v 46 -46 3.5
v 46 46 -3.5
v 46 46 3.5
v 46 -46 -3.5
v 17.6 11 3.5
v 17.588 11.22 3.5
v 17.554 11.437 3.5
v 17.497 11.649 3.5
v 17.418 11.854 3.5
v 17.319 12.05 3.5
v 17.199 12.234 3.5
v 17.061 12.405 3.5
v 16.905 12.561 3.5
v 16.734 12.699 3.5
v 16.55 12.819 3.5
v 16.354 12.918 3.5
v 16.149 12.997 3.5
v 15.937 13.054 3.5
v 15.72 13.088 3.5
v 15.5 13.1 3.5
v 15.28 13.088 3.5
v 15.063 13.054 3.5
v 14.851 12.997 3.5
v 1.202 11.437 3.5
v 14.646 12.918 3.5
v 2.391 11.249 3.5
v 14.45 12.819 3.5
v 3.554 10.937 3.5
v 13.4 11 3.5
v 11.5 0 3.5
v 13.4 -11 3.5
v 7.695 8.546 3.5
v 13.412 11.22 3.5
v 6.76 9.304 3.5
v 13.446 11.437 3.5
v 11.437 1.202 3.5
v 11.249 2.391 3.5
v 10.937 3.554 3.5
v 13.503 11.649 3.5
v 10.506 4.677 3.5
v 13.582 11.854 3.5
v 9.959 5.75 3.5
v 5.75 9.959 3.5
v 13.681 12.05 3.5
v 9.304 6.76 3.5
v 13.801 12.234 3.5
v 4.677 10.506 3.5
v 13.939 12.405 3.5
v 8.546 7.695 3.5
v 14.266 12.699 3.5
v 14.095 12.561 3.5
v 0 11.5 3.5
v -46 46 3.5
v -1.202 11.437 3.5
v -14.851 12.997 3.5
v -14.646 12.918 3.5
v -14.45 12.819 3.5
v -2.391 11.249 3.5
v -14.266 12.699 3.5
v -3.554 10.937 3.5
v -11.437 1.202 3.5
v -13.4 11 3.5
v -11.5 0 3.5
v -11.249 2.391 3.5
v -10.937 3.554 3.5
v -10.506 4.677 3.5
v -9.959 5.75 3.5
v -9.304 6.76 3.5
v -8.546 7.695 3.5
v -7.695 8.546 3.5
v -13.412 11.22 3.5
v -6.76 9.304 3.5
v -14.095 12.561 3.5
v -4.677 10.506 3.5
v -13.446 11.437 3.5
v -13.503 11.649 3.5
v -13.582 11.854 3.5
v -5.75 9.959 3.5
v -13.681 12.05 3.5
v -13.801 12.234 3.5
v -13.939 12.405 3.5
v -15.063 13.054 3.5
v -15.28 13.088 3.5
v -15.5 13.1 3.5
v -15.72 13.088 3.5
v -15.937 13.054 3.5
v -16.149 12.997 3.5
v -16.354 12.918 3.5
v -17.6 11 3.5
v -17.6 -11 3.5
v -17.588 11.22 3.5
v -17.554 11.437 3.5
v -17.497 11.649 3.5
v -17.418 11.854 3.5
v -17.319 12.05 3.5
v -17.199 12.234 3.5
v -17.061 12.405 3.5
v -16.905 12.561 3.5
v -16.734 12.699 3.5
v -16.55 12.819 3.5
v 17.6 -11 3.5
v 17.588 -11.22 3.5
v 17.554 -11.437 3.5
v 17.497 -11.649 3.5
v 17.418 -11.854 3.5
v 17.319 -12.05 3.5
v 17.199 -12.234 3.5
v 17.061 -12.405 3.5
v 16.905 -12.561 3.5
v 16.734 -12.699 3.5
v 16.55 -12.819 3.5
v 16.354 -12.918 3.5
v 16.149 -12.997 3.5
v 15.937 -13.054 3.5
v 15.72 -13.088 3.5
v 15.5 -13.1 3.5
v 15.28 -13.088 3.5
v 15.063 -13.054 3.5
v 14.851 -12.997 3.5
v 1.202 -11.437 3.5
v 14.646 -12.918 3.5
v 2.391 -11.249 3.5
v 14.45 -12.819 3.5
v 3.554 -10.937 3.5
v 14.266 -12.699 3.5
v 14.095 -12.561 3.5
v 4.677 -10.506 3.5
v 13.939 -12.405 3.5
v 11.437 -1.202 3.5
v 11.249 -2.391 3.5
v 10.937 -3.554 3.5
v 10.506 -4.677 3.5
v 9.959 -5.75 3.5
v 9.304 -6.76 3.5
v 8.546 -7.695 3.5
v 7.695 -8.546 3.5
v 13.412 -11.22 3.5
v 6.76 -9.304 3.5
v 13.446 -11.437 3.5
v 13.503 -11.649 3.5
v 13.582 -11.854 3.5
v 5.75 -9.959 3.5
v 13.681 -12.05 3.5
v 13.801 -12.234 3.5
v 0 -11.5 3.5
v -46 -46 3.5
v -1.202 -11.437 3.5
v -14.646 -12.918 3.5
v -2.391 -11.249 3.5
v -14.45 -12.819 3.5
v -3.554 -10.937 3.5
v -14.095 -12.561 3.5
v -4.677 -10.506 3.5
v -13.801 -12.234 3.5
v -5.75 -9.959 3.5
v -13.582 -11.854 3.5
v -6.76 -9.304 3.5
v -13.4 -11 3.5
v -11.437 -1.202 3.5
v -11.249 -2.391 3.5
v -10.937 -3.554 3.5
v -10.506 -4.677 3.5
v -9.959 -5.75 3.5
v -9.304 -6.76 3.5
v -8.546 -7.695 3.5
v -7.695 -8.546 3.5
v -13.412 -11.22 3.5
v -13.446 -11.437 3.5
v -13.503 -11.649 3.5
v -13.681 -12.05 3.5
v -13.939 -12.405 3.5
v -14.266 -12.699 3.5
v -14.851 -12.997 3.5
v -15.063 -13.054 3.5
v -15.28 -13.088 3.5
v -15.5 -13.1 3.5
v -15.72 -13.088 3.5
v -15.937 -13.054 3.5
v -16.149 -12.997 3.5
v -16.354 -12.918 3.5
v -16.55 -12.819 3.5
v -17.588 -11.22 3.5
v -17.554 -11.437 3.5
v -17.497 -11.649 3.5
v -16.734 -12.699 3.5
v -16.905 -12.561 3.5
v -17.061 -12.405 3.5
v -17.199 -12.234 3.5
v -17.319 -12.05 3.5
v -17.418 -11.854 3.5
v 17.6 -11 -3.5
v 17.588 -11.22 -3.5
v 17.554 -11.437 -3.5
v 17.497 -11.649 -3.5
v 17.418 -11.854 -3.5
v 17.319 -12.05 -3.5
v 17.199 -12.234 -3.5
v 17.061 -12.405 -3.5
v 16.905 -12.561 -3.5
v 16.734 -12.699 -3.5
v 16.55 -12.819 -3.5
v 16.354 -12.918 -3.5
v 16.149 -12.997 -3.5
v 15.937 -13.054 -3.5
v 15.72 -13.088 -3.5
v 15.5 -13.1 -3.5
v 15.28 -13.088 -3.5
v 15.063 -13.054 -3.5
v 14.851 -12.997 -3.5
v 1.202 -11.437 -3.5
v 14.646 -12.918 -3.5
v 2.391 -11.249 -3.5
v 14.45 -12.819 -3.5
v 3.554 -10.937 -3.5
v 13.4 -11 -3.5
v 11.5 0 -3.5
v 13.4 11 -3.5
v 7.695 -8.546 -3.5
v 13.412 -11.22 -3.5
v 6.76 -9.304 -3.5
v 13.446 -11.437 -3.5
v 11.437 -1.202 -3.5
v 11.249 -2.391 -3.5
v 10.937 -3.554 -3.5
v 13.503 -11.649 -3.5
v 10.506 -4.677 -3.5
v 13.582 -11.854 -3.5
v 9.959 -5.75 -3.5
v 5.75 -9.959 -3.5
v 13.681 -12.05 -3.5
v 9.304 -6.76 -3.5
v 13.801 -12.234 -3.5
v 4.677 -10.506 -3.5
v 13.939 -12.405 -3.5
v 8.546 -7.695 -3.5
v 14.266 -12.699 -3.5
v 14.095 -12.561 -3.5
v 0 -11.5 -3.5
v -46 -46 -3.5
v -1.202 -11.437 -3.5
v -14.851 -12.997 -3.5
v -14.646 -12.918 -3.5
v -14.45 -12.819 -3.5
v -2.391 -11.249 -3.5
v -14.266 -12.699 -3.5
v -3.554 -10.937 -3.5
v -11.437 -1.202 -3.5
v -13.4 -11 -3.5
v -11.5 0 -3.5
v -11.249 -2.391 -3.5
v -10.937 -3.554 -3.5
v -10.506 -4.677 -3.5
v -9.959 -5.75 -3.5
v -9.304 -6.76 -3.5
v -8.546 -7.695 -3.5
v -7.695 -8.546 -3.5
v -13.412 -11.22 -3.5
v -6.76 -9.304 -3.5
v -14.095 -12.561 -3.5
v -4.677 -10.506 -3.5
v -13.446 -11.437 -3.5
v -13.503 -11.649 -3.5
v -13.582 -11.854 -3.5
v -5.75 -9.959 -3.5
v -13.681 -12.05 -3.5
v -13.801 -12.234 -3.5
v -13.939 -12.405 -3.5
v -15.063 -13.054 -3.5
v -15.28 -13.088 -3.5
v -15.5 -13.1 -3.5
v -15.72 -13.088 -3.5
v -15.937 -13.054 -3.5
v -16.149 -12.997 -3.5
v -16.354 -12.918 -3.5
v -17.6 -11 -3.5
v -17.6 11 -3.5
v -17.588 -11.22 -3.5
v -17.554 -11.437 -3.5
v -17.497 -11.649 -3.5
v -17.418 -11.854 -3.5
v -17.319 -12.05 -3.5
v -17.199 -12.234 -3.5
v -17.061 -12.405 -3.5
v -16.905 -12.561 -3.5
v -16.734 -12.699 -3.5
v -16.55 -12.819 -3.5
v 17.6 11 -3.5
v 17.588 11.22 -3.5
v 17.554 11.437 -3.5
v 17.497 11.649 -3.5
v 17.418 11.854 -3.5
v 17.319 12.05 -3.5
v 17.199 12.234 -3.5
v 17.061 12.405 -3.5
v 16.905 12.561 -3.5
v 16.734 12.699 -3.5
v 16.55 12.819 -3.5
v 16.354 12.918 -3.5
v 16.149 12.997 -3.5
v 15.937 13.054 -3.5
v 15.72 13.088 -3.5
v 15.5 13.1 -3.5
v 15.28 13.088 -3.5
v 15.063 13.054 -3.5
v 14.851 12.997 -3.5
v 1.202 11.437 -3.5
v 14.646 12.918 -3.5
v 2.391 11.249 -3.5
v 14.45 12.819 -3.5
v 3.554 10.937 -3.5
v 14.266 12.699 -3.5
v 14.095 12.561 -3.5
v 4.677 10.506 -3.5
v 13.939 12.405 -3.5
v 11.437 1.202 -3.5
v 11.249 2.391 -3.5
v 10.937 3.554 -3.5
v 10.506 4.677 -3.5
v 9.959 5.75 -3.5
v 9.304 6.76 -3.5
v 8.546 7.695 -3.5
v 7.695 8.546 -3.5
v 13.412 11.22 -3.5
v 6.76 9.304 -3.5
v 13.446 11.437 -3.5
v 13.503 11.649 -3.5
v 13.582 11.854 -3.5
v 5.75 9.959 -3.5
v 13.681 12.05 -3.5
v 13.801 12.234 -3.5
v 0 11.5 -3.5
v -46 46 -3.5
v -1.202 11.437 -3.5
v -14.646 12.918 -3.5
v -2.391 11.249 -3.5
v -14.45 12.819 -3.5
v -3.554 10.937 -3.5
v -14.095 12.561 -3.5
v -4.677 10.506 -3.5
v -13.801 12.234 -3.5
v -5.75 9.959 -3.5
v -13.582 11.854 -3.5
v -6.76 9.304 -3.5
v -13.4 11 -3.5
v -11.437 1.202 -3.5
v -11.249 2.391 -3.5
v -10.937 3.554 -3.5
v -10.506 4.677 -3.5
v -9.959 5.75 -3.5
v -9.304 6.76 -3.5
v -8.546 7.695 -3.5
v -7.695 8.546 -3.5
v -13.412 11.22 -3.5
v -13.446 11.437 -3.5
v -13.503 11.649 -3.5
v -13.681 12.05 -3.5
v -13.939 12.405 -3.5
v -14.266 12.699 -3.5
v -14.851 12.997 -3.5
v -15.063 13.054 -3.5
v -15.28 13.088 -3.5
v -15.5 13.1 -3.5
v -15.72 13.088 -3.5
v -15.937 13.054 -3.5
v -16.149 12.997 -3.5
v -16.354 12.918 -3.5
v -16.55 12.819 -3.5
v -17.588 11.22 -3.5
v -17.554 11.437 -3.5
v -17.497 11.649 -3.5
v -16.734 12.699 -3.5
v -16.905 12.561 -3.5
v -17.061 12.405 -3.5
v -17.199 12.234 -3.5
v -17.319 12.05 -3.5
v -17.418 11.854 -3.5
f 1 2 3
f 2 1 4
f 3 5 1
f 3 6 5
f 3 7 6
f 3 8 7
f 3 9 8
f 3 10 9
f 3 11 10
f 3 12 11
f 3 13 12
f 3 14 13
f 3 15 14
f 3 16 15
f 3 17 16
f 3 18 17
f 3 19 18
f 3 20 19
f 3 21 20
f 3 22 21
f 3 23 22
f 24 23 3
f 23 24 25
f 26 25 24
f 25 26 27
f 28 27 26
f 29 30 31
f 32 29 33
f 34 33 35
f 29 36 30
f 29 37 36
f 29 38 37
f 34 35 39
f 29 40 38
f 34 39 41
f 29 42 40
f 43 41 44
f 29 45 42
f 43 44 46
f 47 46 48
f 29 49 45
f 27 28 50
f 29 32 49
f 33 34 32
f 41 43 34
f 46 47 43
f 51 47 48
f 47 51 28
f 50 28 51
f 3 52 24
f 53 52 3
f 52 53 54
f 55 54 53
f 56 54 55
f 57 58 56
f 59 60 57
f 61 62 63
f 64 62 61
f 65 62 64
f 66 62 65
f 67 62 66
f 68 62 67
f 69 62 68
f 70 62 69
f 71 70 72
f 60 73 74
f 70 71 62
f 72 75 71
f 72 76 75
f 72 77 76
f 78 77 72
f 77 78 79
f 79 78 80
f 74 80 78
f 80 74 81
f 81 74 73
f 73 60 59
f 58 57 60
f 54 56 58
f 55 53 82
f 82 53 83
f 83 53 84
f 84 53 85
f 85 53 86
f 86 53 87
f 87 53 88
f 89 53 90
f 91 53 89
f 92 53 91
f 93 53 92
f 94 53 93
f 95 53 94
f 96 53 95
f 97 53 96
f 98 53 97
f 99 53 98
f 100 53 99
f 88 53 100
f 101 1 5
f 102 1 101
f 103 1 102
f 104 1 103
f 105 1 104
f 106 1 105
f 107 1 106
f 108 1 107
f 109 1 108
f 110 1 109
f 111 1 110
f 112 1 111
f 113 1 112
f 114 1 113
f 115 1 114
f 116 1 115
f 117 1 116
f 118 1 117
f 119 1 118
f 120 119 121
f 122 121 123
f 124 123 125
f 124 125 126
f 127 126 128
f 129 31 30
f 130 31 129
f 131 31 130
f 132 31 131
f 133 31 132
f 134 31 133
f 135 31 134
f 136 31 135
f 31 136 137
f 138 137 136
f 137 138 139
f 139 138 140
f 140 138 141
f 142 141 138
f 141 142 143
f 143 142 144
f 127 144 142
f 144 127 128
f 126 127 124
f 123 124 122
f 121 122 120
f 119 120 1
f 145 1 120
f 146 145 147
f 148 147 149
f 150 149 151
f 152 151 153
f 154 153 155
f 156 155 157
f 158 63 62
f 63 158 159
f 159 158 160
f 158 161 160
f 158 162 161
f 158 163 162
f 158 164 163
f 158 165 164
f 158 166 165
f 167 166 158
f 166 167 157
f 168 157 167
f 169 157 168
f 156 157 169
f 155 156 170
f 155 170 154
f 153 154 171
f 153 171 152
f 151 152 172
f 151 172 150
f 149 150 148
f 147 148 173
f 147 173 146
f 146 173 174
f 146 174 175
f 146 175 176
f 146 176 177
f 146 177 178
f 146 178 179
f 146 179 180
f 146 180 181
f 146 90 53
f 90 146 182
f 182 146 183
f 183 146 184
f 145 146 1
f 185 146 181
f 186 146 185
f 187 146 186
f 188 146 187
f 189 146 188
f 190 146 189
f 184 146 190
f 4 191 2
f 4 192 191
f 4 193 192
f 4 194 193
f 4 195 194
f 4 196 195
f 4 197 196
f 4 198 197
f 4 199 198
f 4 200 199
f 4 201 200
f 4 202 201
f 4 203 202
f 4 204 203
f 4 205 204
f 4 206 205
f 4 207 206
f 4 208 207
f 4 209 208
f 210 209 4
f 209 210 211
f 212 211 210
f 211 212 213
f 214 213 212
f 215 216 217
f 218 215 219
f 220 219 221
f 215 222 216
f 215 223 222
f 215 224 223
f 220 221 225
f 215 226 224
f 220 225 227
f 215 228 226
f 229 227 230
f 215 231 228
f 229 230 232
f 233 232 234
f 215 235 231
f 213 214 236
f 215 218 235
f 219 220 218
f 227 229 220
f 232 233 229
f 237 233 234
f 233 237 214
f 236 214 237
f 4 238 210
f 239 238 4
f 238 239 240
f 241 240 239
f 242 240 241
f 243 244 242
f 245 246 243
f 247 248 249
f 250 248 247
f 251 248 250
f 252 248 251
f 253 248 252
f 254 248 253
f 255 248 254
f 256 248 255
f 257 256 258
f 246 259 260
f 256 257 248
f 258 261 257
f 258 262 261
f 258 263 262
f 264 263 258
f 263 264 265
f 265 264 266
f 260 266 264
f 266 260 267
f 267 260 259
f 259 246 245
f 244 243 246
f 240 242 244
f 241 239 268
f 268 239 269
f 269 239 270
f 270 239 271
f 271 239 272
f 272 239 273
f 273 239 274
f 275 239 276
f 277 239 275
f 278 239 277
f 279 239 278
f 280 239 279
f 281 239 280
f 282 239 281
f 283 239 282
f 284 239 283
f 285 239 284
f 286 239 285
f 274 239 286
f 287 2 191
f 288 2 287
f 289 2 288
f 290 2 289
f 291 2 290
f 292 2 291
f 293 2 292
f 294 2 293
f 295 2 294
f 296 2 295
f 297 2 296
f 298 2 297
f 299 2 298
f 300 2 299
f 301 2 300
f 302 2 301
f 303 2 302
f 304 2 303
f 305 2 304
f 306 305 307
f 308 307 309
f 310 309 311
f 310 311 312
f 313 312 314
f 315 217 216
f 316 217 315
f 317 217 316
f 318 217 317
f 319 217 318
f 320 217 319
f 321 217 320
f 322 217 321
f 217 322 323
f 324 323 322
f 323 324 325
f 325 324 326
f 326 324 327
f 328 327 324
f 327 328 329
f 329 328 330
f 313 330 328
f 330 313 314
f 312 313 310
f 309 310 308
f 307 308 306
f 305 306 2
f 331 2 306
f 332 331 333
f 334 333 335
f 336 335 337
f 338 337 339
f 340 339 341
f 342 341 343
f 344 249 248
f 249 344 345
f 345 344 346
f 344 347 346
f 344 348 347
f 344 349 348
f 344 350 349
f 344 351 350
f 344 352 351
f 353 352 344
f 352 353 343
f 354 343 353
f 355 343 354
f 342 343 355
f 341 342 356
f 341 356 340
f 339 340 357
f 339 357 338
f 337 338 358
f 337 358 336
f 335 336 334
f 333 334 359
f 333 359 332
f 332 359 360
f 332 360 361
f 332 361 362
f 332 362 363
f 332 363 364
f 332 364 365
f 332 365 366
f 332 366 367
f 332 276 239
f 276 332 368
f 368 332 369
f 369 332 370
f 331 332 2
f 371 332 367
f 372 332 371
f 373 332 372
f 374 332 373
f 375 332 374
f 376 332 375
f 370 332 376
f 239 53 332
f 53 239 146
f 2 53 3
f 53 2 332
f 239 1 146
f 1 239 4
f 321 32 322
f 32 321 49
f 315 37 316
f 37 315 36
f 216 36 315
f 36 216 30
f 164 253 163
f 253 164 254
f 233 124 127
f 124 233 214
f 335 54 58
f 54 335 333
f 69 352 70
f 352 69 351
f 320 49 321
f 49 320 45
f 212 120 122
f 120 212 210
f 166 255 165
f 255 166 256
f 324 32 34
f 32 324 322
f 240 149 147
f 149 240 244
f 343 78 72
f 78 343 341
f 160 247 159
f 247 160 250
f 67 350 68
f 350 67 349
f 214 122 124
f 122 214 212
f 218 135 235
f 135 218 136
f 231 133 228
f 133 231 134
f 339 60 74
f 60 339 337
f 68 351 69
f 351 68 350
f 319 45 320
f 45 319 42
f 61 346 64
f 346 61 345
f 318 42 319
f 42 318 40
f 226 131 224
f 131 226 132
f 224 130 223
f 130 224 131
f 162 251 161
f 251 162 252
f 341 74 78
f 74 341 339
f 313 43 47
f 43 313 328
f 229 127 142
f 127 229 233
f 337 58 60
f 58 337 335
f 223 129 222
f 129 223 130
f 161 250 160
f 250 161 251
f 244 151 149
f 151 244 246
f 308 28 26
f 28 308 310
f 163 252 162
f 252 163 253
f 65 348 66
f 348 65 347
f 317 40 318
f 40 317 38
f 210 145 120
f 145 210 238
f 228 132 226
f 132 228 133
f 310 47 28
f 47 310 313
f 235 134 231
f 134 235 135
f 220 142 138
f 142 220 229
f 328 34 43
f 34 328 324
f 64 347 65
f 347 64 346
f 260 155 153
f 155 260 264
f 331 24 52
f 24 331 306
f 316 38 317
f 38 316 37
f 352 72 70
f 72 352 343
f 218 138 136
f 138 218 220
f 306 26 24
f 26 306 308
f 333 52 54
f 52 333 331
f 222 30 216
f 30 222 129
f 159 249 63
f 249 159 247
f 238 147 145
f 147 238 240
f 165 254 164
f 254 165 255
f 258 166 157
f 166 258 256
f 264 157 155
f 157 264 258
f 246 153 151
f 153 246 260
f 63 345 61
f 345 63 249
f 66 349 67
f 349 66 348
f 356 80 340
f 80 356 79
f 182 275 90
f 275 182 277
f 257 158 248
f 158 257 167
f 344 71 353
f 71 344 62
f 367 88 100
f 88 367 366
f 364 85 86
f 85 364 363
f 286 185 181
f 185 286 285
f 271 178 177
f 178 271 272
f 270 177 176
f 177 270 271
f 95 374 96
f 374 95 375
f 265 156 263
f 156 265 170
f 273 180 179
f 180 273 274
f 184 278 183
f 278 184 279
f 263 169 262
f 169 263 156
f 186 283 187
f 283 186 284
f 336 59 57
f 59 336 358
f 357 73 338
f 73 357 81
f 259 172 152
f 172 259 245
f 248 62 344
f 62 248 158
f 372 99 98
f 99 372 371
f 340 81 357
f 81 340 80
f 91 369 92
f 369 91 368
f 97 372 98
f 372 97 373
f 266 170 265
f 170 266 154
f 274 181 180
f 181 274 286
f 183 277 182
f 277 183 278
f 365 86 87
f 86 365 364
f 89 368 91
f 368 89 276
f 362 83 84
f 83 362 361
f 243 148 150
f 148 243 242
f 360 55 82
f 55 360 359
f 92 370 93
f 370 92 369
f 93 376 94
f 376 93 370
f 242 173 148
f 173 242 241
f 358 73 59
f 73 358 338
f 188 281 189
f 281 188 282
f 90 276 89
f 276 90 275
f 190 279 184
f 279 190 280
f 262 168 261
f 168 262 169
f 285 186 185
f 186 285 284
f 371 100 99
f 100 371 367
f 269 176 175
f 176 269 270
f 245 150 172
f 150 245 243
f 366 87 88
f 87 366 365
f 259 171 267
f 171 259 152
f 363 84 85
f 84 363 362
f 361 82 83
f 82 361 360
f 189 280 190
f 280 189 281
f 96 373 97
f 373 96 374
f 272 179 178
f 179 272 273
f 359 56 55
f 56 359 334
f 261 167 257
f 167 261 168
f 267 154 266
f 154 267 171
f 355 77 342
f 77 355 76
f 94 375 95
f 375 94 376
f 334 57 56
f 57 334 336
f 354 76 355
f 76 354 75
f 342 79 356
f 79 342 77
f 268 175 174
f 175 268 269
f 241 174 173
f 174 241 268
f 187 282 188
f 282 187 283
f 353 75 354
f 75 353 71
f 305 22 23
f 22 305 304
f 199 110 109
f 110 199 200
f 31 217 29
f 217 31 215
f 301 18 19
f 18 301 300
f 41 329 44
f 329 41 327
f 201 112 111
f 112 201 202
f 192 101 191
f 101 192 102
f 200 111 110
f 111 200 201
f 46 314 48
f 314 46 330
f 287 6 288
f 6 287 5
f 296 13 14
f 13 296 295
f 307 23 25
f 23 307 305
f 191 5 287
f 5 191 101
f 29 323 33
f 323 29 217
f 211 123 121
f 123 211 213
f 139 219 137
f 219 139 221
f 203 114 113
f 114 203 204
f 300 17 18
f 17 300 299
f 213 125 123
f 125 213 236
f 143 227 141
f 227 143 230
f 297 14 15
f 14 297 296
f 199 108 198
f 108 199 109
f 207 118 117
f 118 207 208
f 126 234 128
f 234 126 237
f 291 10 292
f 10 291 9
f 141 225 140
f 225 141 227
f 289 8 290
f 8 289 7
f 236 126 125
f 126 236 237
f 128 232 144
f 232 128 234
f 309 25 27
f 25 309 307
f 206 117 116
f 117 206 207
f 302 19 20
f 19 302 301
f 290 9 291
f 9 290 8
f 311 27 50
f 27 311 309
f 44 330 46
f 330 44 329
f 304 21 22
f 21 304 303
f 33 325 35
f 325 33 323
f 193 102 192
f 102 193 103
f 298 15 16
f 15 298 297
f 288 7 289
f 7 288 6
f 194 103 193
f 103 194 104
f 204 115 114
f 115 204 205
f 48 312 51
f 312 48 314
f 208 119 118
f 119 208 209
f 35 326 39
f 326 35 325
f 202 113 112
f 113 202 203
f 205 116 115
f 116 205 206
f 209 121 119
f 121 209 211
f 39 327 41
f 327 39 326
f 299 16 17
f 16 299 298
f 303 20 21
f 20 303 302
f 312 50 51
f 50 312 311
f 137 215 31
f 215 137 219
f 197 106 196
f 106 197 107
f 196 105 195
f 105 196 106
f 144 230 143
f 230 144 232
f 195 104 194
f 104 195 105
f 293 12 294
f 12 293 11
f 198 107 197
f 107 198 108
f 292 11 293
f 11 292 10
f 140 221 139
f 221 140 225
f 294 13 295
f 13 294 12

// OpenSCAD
// NEMA 17 adjustable motor plate, 92 mm square.
$fn = 60;
eps = 0.02;
plate = 92;
plate_t = 7;
hole_pitch = 31;
center_d = 23;
slot_l = 22;
slot_d = 4.2;
module slot(x) {
    hull() {
        translate([x, -slot_l / 2, -plate_t / 2 - eps]) cylinder(d = slot_d, h = plate_t + 2 * eps);
        translate([x, slot_l / 2, -plate_t / 2 - eps]) cylinder(d = slot_d, h = plate_t + 2 * eps);
    }
}
difference() {
    cube([plate, plate, plate_t], center = true);
    translate([0, 0, -plate_t / 2 - eps]) cylinder(d = center_d, h = plate_t + 2 * eps);
    slot(-hole_pitch / 2);
    slot(hole_pitch / 2);
}
